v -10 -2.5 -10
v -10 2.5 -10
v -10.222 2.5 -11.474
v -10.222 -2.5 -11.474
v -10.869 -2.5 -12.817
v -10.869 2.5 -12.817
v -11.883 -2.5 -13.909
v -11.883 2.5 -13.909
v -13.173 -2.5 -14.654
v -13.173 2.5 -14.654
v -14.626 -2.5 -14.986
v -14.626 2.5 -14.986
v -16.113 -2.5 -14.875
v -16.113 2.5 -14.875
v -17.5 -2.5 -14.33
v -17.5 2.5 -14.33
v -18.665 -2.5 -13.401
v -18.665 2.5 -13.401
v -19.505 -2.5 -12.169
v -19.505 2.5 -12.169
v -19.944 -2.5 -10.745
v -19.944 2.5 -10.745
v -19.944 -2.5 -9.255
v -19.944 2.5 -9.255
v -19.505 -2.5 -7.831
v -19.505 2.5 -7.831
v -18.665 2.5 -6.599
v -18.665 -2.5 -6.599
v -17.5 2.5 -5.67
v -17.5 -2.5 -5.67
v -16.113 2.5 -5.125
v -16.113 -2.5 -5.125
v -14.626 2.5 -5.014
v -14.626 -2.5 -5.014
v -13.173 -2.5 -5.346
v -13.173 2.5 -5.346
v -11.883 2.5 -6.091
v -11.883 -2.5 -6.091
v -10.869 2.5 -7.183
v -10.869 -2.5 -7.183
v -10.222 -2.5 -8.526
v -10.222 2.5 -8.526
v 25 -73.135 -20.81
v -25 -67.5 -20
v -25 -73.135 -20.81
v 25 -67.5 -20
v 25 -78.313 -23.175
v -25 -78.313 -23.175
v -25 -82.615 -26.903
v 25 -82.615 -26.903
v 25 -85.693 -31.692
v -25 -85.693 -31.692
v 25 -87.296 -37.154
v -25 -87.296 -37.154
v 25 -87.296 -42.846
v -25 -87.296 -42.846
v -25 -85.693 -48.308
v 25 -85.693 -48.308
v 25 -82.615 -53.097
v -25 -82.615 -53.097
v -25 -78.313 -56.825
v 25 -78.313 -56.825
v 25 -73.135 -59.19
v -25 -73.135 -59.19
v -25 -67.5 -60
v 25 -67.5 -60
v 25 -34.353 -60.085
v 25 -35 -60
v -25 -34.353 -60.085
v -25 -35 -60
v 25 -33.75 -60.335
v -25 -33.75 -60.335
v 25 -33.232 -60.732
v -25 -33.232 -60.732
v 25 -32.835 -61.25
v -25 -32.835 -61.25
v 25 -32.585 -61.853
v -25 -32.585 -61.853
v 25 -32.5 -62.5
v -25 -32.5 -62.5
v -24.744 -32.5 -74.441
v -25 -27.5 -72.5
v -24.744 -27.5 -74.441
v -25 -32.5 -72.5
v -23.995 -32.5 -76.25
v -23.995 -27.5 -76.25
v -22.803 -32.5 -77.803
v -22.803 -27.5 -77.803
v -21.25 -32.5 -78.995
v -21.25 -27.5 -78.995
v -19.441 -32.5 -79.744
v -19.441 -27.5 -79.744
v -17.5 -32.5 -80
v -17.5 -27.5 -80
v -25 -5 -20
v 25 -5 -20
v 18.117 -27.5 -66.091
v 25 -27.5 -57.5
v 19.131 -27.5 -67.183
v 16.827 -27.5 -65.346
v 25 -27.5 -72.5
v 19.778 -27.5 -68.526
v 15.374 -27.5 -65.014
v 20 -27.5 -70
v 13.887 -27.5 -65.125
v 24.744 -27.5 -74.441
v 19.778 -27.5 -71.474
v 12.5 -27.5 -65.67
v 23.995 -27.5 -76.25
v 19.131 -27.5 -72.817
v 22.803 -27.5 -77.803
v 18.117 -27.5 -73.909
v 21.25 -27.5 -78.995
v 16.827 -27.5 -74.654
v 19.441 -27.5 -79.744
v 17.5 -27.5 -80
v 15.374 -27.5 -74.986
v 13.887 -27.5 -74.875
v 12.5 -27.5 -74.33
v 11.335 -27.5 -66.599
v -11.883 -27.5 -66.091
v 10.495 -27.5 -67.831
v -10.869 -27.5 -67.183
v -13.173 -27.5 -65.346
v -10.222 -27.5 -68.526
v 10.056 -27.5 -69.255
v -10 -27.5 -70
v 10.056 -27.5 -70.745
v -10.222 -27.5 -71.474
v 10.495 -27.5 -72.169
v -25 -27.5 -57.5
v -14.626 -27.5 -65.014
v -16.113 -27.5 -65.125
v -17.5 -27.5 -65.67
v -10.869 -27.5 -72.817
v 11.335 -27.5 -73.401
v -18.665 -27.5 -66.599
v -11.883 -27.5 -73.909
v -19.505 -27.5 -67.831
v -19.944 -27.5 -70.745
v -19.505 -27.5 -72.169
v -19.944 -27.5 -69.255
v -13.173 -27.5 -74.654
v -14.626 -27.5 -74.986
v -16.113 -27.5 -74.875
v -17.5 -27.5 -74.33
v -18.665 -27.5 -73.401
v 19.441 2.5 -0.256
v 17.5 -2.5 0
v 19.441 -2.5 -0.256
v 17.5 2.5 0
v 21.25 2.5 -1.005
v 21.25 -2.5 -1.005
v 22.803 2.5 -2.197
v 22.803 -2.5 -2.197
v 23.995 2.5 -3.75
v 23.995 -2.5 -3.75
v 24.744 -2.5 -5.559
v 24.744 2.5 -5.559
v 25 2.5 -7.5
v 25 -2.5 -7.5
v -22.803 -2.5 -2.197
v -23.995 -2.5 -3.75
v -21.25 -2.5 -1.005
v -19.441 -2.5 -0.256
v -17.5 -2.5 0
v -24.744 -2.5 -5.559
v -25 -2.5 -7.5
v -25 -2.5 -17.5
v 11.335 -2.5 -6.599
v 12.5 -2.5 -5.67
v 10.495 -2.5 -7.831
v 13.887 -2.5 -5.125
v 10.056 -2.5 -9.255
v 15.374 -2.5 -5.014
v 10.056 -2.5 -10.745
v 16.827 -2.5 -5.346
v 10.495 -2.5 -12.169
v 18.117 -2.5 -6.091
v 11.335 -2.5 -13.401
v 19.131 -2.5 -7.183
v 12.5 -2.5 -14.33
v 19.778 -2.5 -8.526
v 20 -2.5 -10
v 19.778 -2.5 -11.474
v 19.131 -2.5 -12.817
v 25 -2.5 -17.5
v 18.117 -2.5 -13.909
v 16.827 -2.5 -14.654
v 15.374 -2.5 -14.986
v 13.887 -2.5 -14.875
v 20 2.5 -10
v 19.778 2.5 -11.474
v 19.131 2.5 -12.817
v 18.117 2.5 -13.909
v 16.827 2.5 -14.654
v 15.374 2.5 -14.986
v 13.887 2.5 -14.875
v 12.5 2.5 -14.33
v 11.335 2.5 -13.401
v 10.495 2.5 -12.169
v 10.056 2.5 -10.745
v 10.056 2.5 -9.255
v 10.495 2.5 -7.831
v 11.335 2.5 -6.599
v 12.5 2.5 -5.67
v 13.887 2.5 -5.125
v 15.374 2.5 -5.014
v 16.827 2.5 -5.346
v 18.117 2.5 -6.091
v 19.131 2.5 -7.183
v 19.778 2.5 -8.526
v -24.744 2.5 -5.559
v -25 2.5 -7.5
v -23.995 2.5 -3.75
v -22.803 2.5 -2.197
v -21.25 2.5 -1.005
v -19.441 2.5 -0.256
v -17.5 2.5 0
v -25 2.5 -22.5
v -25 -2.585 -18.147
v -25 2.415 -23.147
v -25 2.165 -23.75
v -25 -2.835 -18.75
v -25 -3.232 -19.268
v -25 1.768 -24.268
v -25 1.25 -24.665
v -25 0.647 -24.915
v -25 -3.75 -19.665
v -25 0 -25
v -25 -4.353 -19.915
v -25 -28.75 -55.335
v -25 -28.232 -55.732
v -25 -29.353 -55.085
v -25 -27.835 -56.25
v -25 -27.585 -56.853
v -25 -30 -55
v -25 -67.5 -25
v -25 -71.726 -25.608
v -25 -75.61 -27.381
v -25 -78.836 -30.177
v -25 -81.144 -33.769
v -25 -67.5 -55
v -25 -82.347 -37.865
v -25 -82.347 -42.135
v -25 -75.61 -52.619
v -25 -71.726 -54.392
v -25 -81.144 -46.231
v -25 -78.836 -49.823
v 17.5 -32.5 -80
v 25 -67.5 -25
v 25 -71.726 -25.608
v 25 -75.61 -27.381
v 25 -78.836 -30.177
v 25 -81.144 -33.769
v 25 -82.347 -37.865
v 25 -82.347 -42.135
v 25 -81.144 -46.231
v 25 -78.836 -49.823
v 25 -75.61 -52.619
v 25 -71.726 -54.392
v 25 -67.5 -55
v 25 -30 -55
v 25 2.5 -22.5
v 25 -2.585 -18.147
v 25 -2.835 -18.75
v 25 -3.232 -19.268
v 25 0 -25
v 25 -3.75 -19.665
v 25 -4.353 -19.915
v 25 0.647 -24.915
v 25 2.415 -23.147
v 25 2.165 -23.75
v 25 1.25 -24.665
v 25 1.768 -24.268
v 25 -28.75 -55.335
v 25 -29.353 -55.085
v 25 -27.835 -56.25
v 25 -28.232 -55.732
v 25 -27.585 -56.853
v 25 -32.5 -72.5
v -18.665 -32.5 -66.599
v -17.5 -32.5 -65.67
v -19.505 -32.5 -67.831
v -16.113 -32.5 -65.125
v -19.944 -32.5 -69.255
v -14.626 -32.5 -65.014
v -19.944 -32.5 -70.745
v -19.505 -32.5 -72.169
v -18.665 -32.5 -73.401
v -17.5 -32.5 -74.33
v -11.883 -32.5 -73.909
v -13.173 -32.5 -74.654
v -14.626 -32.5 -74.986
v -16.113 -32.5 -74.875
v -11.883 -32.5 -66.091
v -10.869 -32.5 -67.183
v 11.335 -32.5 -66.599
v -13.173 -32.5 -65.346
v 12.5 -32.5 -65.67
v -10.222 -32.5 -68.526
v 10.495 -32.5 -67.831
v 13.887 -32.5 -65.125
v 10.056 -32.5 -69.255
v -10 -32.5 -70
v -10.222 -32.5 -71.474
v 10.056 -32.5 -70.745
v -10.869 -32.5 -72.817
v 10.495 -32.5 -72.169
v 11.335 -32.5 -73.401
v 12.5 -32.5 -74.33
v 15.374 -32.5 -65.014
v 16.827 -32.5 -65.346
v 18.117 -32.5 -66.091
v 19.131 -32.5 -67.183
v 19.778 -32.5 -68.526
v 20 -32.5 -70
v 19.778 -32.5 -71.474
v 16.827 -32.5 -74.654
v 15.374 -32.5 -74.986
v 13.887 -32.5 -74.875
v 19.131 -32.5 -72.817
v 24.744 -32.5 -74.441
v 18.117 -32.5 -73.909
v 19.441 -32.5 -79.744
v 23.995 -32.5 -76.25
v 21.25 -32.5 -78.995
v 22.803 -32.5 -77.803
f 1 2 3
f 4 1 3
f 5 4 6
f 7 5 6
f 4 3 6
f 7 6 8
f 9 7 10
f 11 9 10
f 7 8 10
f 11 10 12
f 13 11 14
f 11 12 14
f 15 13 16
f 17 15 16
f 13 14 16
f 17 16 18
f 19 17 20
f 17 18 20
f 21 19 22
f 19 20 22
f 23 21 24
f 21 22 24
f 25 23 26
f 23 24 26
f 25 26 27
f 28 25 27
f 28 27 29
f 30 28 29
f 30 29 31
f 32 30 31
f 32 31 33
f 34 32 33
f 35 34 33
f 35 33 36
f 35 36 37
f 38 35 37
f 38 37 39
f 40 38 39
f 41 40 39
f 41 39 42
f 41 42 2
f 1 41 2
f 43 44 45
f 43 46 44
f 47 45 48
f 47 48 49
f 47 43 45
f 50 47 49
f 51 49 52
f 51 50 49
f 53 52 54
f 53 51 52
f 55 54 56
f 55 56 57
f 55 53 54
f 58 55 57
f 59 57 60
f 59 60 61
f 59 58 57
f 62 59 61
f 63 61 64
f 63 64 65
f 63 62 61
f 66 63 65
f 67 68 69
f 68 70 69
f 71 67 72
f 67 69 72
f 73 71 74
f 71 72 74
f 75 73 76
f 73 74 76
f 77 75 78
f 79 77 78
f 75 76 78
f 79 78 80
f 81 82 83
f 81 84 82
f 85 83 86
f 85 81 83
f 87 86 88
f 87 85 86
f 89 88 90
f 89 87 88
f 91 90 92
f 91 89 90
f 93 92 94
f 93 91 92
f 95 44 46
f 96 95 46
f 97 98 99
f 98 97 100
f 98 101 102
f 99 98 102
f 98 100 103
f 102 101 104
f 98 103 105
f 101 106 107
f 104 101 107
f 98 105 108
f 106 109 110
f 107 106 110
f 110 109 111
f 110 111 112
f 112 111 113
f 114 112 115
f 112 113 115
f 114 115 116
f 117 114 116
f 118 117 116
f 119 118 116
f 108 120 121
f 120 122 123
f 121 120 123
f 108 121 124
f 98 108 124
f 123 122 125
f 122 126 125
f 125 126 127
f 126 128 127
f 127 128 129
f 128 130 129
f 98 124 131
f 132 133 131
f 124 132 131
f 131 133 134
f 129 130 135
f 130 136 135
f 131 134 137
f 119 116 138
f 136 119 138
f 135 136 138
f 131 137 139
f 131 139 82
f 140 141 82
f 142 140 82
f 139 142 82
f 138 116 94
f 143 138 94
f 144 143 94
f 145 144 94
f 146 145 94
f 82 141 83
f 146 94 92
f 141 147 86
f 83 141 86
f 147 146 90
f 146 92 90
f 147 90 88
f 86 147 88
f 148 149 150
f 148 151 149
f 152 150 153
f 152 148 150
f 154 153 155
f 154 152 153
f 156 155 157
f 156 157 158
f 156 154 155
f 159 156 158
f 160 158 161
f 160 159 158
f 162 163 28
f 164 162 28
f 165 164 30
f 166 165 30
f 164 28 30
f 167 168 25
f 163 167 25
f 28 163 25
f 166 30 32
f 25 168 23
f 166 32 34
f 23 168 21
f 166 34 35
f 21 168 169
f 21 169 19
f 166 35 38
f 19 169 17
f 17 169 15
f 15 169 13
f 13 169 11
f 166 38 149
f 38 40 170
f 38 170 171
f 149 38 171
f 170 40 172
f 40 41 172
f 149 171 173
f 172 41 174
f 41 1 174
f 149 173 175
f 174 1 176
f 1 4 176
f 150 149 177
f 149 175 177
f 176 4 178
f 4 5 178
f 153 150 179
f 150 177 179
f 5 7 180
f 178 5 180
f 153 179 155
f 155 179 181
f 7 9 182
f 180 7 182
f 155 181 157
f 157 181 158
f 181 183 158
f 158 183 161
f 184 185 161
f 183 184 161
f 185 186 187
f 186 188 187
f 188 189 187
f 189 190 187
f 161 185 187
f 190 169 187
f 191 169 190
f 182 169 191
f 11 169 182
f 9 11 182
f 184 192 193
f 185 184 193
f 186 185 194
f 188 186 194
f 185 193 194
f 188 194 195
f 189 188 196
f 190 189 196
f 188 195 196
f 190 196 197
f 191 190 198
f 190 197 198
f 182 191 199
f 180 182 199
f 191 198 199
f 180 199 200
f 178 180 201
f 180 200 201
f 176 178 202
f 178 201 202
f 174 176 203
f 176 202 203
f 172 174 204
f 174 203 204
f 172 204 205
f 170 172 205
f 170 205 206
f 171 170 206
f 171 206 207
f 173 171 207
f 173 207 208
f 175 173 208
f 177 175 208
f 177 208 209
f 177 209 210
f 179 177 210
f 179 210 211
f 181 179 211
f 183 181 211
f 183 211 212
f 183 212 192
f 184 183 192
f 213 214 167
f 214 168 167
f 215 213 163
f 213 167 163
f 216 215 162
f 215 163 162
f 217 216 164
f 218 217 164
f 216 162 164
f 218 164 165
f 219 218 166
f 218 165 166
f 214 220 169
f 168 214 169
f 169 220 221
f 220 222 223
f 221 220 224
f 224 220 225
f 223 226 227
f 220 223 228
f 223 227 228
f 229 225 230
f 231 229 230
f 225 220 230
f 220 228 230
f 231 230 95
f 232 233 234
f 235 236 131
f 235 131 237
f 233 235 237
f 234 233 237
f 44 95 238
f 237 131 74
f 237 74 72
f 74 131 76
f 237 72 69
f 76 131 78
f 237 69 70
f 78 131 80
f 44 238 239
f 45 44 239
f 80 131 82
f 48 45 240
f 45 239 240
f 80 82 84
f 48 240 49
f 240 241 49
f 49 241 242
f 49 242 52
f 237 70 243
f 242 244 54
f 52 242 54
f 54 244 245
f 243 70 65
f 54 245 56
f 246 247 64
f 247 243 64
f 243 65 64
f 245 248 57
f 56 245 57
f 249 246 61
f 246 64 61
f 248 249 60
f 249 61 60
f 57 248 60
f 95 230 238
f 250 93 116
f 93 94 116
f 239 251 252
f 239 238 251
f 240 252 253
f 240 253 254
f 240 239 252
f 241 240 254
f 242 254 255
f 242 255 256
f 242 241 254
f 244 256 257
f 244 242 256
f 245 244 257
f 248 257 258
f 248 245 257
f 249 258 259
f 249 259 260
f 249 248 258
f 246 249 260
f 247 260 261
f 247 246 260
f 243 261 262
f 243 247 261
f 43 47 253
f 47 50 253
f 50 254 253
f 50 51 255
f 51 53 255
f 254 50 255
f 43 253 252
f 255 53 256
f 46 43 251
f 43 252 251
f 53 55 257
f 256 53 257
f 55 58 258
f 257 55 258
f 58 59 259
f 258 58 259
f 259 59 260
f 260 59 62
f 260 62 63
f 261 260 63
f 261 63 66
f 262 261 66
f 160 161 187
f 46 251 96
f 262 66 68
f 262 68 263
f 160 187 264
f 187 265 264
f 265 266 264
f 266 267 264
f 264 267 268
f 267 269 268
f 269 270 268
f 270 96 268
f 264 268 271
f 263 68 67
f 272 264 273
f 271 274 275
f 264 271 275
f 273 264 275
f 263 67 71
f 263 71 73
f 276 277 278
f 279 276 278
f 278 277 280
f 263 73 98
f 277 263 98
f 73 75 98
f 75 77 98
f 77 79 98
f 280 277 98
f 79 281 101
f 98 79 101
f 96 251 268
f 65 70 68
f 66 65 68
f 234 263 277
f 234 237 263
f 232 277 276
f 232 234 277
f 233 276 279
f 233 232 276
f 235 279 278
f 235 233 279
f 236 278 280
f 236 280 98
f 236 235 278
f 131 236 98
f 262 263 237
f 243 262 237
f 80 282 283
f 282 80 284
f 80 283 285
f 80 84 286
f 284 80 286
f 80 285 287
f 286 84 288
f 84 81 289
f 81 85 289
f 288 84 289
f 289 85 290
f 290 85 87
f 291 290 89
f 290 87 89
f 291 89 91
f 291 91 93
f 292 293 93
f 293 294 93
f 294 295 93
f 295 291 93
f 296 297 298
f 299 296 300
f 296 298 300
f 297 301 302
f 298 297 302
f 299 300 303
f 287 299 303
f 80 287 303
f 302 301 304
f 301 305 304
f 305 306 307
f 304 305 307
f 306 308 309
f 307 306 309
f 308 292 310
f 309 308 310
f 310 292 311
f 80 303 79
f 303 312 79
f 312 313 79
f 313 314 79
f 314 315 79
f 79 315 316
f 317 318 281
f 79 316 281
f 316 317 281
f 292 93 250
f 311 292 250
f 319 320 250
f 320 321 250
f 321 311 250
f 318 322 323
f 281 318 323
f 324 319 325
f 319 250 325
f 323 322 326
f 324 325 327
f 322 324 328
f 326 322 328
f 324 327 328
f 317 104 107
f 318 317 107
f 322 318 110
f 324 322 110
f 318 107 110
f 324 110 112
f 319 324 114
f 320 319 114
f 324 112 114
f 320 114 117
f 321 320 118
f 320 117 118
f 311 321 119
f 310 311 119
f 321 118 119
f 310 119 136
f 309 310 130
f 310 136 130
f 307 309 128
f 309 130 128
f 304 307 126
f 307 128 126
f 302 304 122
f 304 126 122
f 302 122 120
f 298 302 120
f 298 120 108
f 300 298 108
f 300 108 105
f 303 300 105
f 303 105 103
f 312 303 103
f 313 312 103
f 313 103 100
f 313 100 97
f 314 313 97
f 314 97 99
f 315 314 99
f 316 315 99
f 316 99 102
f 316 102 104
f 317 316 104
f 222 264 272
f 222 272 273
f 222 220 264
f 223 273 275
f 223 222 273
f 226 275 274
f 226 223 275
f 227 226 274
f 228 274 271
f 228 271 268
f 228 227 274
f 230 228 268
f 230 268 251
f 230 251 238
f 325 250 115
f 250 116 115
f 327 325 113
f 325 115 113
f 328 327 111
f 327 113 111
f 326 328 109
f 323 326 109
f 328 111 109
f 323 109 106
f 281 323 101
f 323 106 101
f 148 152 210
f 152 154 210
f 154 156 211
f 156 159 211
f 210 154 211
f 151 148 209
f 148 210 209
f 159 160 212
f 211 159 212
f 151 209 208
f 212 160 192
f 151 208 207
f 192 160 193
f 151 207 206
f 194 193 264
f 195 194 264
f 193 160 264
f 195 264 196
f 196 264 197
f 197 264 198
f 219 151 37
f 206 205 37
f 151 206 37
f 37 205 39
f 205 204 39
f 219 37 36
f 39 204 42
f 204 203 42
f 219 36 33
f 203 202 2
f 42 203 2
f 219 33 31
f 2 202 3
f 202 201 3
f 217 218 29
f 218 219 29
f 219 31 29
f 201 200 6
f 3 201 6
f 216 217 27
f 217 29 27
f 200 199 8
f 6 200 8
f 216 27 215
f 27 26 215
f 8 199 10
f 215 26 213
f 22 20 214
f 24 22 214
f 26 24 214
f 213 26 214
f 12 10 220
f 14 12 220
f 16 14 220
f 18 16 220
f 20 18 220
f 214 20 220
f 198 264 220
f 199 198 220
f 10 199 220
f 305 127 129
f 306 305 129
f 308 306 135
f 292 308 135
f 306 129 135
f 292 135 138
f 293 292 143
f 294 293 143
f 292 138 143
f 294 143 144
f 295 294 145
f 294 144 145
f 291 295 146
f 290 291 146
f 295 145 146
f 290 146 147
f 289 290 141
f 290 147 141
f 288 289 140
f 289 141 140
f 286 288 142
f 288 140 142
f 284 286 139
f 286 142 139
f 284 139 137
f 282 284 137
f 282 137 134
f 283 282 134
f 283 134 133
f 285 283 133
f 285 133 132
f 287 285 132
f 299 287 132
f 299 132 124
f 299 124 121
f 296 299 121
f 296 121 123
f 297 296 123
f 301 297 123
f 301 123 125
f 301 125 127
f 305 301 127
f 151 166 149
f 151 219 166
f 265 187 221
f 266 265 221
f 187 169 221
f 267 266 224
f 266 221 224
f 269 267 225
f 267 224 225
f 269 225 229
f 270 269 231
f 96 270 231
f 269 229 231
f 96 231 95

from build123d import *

# Parameters (mm, degrees)
SKETCH2_W          = 50
SKETCH2_H          = 5
FILLET2_R          = 2.5
SKETCH3_R          = 5
CUT_EXTRUDE1_DEPTH = 50
FILLET3_R          = 7.5


with BuildPart() as part:
    # Sweep1: sweep along a path in Sketch1
    with BuildLine(Plane(origin=(0, 0, 0), x_dir=(0, 0, -1), z_dir=(1, 0, 0))) as sweep1_path:
        Line((0, 0), (22.5, 0))
        Line((22.5, 0), (22.5, -67.5))
        ThreePointArc((22.5, -67.5), (40, -85), (57.5, -67.5))
        Line((57.5, -67.5), (57.5, -30))
        Line((57.5, -30), (80, -30))
    # Sketch2 → Sweep1 (sweep)
    with BuildSketch(Plane.XY):
        Rectangle(SKETCH2_W, SKETCH2_H)
    sweep(path=sweep1_path.line, transition=Transition.RIGHT)

    # Fillet2
    fillet2_edges = [part.edges().sort_by_distance(p)[0] for p in [
        (0, 2.5, -25),
        (0, -2.5, -20),
        (0, -27.5, -55),
        (0, -32.5, -60),
    ]]
    fillet(fillet2_edges, radius=FILLET2_R)

    # Sketch3 → Cut-Extrude1 (cut)
    with BuildSketch(Plane(origin=(0, 2.5, 0), x_dir=(1, 0, 0), z_dir=(0, 1, 0))):
        with Locations((-15, 70)):
            Circle(SKETCH3_R)
        with Locations((15, 70)):
            Circle(SKETCH3_R)
        with Locations((15, 10)):
            Circle(SKETCH3_R)
        with Locations((-15, 10)):
            Circle(SKETCH3_R)
    extrude(amount=-CUT_EXTRUDE1_DEPTH, mode=Mode.SUBTRACT)

    # Fillet3
    fillet3_edges = [part.edges().sort_by_distance(p)[0] for p in [
        (25, 0, 0),
        (-25, -30, -80),
        (25, -30, -80),
        (-25, 0, 0),
    ]]
    fillet(fillet3_edges, radius=FILLET3_R)


solid = part.part
